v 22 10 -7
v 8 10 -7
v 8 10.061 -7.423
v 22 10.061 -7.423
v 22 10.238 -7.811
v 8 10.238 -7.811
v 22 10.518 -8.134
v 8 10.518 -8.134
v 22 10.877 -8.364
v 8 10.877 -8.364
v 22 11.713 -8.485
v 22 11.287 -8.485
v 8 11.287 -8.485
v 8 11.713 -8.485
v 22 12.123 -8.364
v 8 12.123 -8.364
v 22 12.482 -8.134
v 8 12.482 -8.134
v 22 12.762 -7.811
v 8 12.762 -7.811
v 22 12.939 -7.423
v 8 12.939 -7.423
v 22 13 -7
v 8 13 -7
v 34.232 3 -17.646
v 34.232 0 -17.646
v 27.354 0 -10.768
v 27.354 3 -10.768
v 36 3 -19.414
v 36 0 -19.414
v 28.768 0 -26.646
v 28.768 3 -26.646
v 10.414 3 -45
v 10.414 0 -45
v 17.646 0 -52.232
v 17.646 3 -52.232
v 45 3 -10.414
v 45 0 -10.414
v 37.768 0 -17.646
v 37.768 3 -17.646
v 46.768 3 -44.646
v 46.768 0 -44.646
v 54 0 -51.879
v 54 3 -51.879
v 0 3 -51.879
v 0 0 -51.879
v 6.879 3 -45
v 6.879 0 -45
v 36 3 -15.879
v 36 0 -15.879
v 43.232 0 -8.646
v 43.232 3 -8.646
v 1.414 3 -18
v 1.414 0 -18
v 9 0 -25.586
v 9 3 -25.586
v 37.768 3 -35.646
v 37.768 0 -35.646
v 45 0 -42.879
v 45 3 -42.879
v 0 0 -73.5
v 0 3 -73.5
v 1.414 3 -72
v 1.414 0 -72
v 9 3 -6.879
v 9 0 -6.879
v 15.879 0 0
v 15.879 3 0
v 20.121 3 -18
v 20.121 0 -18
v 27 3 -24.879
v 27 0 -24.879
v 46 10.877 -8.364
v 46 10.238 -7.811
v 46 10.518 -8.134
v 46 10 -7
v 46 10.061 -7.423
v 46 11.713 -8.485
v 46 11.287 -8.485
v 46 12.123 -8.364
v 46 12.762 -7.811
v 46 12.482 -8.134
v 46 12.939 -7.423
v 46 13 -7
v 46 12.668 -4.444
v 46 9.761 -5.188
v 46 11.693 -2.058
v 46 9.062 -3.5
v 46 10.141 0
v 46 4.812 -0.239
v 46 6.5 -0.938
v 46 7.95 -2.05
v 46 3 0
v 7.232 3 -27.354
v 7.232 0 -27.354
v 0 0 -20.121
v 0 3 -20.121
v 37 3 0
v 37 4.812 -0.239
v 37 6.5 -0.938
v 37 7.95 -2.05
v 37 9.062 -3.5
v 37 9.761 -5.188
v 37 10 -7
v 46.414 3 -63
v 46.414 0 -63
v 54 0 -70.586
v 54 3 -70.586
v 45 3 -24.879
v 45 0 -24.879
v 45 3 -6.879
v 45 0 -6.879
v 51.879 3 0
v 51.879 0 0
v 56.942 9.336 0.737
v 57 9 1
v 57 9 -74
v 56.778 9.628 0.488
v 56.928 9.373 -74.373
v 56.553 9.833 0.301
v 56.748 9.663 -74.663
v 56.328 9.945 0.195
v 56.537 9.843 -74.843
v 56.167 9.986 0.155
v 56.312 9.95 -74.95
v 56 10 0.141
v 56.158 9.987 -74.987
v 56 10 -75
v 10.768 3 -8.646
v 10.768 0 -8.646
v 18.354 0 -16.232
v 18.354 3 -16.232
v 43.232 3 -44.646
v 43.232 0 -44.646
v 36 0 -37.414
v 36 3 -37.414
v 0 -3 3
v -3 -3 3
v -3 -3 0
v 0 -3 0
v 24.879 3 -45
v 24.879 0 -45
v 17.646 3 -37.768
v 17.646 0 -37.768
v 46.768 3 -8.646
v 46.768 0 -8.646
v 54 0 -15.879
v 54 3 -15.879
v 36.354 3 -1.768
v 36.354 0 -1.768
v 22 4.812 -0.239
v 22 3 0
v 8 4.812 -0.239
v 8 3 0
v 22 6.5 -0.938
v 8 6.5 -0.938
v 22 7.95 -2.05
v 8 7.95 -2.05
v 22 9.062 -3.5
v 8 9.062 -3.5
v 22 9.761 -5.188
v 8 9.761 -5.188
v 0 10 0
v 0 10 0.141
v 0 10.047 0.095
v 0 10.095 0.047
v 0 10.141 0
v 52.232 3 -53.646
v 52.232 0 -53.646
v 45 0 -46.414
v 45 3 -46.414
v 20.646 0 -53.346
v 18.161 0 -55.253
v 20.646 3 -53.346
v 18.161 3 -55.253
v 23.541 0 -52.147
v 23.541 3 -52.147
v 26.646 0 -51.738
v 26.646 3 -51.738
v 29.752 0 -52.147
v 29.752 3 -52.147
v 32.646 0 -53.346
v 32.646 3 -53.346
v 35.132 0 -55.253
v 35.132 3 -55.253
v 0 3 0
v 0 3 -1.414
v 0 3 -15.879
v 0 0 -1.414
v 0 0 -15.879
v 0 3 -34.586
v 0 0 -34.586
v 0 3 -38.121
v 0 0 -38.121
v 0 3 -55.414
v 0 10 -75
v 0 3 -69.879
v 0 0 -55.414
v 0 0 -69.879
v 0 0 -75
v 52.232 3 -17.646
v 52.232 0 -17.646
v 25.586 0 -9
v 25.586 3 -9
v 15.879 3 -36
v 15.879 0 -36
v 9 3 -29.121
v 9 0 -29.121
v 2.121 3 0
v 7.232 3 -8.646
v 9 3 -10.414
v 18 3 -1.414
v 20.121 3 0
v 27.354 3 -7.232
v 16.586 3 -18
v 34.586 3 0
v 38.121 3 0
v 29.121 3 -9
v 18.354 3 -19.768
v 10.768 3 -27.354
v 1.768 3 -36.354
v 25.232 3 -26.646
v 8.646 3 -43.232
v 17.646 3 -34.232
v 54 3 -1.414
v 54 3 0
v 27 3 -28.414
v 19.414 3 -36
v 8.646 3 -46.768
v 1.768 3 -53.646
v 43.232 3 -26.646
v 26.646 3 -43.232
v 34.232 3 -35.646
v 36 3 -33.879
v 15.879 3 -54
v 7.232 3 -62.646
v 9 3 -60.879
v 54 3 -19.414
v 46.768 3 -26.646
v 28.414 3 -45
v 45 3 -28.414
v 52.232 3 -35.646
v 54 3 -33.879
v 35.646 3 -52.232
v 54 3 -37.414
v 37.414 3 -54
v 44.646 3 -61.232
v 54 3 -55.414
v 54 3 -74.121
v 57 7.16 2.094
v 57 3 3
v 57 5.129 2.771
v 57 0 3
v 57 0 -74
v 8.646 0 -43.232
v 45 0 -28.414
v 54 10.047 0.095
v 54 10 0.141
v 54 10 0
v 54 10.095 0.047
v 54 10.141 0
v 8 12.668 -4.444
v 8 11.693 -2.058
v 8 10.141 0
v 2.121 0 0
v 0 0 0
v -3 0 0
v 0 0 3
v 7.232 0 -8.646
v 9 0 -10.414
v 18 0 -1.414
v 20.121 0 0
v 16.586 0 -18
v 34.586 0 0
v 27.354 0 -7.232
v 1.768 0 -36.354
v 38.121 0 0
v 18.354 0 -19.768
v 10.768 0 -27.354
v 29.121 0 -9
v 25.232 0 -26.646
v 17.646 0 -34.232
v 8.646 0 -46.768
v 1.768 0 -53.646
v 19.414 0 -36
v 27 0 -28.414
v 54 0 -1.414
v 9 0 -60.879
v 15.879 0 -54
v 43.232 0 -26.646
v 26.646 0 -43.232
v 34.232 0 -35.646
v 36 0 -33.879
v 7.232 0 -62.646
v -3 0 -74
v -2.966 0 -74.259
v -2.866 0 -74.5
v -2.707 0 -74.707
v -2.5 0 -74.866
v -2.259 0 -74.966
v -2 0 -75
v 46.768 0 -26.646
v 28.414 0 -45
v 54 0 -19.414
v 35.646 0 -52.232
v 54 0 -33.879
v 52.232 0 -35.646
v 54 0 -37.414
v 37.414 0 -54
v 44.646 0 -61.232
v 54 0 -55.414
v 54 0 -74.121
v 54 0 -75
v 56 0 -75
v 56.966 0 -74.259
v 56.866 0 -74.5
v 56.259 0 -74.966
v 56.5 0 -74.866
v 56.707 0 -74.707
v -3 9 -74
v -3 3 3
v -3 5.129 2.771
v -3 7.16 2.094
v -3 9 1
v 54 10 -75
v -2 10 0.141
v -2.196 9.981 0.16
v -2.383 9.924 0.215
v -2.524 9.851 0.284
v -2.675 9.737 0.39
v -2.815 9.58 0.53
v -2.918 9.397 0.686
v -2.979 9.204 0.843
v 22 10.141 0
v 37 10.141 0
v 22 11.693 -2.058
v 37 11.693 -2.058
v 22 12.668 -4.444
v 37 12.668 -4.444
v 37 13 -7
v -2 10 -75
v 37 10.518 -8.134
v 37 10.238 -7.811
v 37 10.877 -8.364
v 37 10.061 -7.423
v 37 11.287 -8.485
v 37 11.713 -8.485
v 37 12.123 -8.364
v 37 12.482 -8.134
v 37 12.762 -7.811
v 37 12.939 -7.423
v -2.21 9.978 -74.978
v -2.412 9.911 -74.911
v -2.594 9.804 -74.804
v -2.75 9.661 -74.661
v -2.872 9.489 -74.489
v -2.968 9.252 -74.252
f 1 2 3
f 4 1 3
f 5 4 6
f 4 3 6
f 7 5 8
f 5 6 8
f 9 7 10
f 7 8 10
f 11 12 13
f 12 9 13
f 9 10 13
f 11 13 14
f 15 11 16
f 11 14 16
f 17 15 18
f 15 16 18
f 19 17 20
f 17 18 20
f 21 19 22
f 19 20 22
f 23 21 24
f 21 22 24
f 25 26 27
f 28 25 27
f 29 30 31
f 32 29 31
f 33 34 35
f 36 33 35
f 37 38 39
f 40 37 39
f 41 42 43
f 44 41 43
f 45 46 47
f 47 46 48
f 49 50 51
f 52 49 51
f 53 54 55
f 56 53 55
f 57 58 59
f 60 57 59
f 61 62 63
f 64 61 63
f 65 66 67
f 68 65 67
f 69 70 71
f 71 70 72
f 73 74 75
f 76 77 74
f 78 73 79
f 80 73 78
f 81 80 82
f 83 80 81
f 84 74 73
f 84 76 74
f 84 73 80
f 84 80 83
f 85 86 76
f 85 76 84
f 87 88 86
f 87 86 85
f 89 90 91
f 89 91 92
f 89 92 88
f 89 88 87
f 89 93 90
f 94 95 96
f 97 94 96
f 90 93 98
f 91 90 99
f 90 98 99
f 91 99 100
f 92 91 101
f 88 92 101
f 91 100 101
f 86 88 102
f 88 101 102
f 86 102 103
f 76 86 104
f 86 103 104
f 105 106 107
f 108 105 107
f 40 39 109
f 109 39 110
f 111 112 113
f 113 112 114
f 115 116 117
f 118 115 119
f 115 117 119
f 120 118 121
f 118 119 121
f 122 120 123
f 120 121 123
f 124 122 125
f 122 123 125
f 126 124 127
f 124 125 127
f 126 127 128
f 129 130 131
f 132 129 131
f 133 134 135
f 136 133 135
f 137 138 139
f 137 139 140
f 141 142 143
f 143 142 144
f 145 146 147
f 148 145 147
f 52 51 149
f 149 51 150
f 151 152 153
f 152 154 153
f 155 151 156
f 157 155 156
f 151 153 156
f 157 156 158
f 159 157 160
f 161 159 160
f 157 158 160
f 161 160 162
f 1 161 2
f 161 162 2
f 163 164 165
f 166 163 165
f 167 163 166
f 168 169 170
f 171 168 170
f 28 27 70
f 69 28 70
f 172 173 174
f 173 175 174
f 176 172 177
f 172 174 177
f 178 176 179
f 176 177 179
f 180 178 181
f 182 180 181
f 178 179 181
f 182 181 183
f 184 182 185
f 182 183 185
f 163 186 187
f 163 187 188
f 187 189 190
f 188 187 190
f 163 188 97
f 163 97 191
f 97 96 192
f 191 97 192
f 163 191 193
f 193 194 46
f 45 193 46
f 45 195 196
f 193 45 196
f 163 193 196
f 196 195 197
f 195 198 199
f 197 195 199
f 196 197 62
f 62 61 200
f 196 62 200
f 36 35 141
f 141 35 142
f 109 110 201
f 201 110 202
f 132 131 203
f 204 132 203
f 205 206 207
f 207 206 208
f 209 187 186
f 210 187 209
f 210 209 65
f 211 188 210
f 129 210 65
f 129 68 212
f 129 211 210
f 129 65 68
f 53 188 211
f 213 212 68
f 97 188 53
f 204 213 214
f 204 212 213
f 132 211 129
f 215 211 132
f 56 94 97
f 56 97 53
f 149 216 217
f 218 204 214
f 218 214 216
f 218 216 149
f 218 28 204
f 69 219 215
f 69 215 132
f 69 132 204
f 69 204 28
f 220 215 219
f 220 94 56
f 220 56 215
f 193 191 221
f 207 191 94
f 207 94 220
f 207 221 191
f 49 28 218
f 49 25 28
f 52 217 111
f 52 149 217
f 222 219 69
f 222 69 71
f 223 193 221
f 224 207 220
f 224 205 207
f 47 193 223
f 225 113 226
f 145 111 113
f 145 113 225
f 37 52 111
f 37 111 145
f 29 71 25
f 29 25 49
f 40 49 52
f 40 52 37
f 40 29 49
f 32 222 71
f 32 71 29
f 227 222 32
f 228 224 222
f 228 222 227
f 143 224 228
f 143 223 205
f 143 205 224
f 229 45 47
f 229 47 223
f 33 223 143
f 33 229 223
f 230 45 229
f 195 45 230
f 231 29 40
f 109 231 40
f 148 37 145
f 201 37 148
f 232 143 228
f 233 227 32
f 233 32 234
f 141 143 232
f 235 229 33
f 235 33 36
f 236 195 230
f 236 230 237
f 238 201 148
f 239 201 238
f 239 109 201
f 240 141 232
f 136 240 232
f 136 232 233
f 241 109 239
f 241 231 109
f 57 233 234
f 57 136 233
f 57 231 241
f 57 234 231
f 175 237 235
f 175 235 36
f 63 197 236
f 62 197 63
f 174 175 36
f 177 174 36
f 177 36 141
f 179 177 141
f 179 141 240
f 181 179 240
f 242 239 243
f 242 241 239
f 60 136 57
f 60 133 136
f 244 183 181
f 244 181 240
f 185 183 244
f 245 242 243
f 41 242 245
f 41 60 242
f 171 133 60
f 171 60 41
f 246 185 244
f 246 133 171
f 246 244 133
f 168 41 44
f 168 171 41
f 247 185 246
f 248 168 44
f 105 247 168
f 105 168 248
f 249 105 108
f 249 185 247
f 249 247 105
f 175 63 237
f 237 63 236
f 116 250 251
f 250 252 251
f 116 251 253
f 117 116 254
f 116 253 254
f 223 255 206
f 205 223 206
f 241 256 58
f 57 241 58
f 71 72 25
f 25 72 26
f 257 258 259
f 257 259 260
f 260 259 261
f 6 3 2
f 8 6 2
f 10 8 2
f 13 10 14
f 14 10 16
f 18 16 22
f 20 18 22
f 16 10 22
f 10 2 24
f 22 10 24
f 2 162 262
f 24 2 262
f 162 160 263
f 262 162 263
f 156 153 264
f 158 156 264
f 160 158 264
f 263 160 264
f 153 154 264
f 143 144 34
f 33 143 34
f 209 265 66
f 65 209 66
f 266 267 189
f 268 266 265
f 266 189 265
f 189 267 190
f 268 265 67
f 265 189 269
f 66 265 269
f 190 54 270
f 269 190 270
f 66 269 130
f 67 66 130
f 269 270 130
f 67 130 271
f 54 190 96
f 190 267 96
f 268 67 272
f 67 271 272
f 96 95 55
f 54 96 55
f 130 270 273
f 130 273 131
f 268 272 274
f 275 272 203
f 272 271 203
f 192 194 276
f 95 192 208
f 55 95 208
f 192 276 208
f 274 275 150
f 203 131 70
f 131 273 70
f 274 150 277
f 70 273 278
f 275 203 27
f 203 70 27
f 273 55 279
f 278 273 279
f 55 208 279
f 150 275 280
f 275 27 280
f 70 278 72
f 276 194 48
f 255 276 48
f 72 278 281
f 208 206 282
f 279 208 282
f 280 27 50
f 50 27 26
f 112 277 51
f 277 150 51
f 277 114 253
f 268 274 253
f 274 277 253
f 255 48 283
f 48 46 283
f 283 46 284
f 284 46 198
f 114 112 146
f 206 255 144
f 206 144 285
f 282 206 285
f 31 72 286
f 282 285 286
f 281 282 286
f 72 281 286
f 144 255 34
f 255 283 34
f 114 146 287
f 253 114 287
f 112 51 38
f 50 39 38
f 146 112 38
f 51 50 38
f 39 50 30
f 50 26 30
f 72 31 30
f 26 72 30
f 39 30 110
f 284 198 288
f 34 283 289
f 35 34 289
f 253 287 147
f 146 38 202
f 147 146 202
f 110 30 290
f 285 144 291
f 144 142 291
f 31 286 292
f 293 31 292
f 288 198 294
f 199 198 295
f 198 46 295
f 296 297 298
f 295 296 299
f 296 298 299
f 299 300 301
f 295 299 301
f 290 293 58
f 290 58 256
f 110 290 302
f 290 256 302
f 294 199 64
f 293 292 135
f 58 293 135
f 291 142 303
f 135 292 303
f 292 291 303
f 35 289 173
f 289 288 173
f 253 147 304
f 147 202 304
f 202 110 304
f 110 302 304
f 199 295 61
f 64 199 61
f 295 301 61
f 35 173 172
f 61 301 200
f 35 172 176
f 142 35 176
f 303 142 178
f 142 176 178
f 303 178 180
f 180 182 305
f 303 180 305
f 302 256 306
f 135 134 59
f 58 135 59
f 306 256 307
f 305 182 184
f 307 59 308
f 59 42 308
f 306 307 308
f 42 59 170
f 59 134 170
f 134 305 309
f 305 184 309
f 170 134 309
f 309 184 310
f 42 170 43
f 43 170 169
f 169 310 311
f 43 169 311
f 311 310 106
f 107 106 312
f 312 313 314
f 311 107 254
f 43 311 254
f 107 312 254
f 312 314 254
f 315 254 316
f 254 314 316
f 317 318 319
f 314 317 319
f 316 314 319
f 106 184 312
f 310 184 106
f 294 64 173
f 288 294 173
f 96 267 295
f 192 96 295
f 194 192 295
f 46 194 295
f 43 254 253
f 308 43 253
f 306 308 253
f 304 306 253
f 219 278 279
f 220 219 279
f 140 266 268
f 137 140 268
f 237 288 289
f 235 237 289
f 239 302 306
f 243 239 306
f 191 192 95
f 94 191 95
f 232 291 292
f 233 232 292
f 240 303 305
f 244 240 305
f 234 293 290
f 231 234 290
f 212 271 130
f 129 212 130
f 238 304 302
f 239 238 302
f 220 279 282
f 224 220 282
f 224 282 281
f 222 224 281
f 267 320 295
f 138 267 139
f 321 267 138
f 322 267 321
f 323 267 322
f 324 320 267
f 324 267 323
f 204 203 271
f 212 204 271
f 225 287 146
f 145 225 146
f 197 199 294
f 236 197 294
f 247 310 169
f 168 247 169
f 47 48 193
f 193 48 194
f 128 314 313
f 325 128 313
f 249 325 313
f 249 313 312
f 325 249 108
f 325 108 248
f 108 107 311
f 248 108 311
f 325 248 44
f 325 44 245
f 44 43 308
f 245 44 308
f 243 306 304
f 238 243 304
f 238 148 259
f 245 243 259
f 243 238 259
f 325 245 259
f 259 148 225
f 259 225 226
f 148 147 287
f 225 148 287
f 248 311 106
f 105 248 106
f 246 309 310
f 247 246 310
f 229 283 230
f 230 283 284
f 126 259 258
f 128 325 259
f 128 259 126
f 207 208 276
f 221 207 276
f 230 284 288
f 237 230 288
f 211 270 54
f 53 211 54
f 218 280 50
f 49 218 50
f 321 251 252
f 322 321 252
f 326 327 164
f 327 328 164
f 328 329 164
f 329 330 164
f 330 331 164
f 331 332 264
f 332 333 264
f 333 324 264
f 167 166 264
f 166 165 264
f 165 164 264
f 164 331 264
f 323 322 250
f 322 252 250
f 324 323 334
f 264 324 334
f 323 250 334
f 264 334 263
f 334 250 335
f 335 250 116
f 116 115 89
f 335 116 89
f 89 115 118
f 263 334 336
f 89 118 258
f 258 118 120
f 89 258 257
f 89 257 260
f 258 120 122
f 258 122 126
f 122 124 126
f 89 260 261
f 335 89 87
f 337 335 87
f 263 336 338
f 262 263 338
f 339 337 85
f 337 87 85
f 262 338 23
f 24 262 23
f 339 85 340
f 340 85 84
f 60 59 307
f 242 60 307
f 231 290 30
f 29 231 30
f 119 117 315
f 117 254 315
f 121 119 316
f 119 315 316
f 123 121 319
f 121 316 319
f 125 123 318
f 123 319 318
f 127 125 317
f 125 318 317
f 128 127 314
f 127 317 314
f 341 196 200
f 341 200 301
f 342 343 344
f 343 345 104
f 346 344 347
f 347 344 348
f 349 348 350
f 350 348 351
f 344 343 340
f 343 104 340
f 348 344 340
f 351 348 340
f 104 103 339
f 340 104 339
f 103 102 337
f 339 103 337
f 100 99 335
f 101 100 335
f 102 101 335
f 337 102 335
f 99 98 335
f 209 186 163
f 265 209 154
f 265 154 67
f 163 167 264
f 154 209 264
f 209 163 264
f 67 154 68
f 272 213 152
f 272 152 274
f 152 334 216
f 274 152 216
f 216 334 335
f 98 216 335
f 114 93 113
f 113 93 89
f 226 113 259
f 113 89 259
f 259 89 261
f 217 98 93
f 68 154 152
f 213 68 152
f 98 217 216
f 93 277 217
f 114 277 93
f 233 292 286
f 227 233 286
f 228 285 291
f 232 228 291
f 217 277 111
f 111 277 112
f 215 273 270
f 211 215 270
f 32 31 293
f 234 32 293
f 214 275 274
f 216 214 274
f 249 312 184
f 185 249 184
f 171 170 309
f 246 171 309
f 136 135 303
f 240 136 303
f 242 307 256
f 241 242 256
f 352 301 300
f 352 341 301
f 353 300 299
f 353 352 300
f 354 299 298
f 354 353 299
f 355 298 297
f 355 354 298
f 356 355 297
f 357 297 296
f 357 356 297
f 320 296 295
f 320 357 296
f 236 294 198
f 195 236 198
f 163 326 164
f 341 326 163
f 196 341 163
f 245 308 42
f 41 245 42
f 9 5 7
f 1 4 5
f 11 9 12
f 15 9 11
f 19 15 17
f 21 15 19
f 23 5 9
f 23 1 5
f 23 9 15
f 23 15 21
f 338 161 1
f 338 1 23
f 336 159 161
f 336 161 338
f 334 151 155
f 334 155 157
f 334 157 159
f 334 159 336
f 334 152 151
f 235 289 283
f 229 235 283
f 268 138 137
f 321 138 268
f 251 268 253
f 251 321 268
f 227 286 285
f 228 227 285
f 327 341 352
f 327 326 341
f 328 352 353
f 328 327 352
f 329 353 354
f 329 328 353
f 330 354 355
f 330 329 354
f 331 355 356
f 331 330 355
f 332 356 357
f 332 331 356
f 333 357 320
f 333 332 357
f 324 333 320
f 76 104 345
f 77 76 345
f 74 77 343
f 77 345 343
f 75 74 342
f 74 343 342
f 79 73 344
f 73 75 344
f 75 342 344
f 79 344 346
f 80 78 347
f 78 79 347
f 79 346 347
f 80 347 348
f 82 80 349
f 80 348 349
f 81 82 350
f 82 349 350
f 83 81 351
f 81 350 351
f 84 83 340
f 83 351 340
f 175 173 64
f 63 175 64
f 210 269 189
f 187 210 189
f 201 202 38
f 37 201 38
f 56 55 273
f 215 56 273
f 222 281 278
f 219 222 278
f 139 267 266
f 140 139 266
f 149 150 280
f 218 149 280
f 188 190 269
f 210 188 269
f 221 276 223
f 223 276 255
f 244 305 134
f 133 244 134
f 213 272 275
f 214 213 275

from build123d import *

# Parameters (mm, degrees)
SKETCH1_W               = 60
SKETCH1_H               = 78
SKETCH1_W_2             = 54
SKETCH1_H_2             = 72
EXTRUDE_THIN1_DEPTH     = 3
EXTRUDE_THIN2_DEPTH     = 3
BOSS_EXTRUDE1_DEPTH     = 7
SKETCH5_W               = 9
SKETCH5_H               = 3
BOSS_EXTRUDE2_DEPTH     = 10
SKETCH5_W_2             = 14
BOSS_EXTRUDE2_2_DEPTH   = 10
SKETCH6_W               = 3
SKETCH6_H               = 3
BOSS_EXTRUDE3_DEPTH     = 3
CUT_EXTRUDE1_DEPTH      = 95.731198662
SKETCH9_W               = 54
SKETCH9_H               = 3
BOSS_EXTRUDE4_DEPTH     = 3
FILLET1_R               = 7
FILLET2_R               = 10
CUT_EXTRUDE2_REACH      = 92.526
CUT_EXTRUDE3_DEPTH      = 97.922649572
CUT_EXTRUDE3_DEPTH_BACK = 97.922649572
SKETCH11_W              = 3
SKETCH11_H              = 3
FILLET3_R               = 1
CUT_EXTRUDE4_DEPTH      = 95.731198812
FILLET4_R               = 12
SKETCH14_W              = 3
SKETCH14_H              = 3
BOSS_EXTRUDE5_DEPTH     = 3


# Read off the part's stored shape, not the designer's step: Extrude-Thin2
# Some blends are built 0.0001 mm under size
with BuildPart() as part:
    # Sketch1 → Extrude-Thin1 (new body)
    with BuildSketch(Plane(origin=(0, 0, 0), x_dir=(1, 0, 0), z_dir=(0, 1, 0))):
        with Locations((27, 36)):
            Rectangle(SKETCH1_W, SKETCH1_H)
        with Locations((27, 36)):
            Rectangle(SKETCH1_W_2, SKETCH1_H_2, mode=Mode.SUBTRACT)
    extrude(amount=EXTRUDE_THIN1_DEPTH)

    # Extrude-Thin2 outline → Extrude-Thin2 (add)
    with BuildSketch(Plane(origin=(0, 0, 0), x_dir=(1, 0, 0), z_dir=(0, 1, 0))):
        Polygon((0, 69.878679656), (7.232233047, 62.646446609), (0, 55.414213562), (0, 51.878679656), (6.878679656, 45), (0, 38.121320344), (0, 34.585786438), (7.232233047, 27.353553391), (0, 20.121320344), (0, 15.878679656), (7.232233047, 8.646446609), (0, 1.414213562), (0, 0), (2.121320344, 0), (9, 6.878679656), (15.878679656, 0), (20.121320344, 0), (27.353553391, 7.232233047), (34.585786438, 0), (38.121320344, 0), (45, 6.878679656), (51.878679656, 0), (54, 0), (54, 1.414213562), (46.767766953, 8.646446609), (54, 15.878679656), (54, 19.414213562), (46.767766953, 26.646446609), (54, 33.878679656), (54, 37.414213562), (46.767766953, 44.646446609), (54, 51.878679656), (54, 55.414213562), (46.414213562, 63), (54, 70.585786438), (54, 72), (51.878679656, 72), (44.646446609, 64.767766953), (37.414213562, 72), (33.878679656, 72), (26.646446609, 64.767766953), (19.414213562, 72), (16.585786438, 72), (9, 64.414213562), (1.414213562, 72), (0, 72), align=None)
        Polygon((10.767766953, 8.646446609), (18.353553391, 16.232233047), (25.585786438, 9), (18, 1.414213562), align=None, mode=Mode.SUBTRACT)
        Polygon((9, 10.414213562), (1.414213562, 18), (9, 25.585786438), (16.585786438, 18), align=None, mode=Mode.SUBTRACT)
        Polygon((18.353553391, 19.767766953), (10.767766953, 27.353553391), (17.646446609, 34.232233047), (25.232233047, 26.646446609), align=None, mode=Mode.SUBTRACT)
        Polygon((26.646446609, 43.232233047), (34.232233047, 35.646446609), (27, 28.414213562), (19.414213562, 36), align=None, mode=Mode.SUBTRACT)
        Polygon((29.121320344, 9), (36, 15.878679656), (43.232233047, 8.646446609), (36.353553391, 1.767766953), align=None, mode=Mode.SUBTRACT)
        Polygon((20.121320344, 18), (27, 24.878679656), (34.232233047, 17.646446609), (27.353553391, 10.767766953), align=None, mode=Mode.SUBTRACT)
        Polygon((45, 24.878679656), (52.232233047, 17.646446609), (45, 10.414213562), (37.767766953, 17.646446609), align=None, mode=Mode.SUBTRACT)
        Polygon((36, 33.878679656), (43.232233047, 26.646446609), (36, 19.414213562), (28.767766953, 26.646446609), align=None, mode=Mode.SUBTRACT)
        Polygon((52.232233047, 35.646446609), (45, 28.414213562), (37.767766953, 35.646446609), (45, 42.878679656), align=None, mode=Mode.SUBTRACT)
        Polygon((15.878679656, 36), (9, 29.121320344), (1.767766953, 36.353553391), (8.646446609, 43.232233047), align=None, mode=Mode.SUBTRACT)
        Polygon((9, 60.878679656), (15.878679656, 54), (8.646446609, 46.767766953), (1.767766953, 53.646446609), align=None, mode=Mode.SUBTRACT)
        Polygon((17.646446609, 52.232233047), (24.878679656, 45), (17.646446609, 37.767766953), (10.414213562, 45), align=None, mode=Mode.SUBTRACT)
        Polygon((24.878679656, 63), (17.646446609, 55.767766953), (10.767766953, 62.646446609), (18, 69.878679656), align=None, mode=Mode.SUBTRACT)
        Polygon((33.878679656, 54), (26.646446609, 46.767766953), (19.414213562, 54), (26.646446609, 61.232233047), align=None, mode=Mode.SUBTRACT)
        Polygon((43.232233047, 44.646446609), (36, 37.414213562), (28.414213562, 45), (35.646446609, 52.232233047), align=None, mode=Mode.SUBTRACT)
        Polygon((45, 46.414213562), (37.414213562, 54), (44.646446609, 61.232233047), (52.232233047, 53.646446609), align=None, mode=Mode.SUBTRACT)
        Polygon((42.878679656, 63), (35.646446609, 55.767766953), (28.414213562, 63), (35.646446609, 70.232233047), align=None, mode=Mode.SUBTRACT)
    extrude(amount=EXTRUDE_THIN2_DEPTH)

    # Sketch4 → Boss-Extrude1 (add)
    with BuildSketch(Plane(origin=(0, 3, 0), x_dir=(1, 0, 0), z_dir=(0, 1, 0))):
        Polygon((0, 0), (0, 72), (0, 75), (-3, 75), (-3, -3), (57, -3), (57, 75), (54, 75), (54, 72), (54, 0), align=None)
    extrude(amount=BOSS_EXTRUDE1_DEPTH)

    # Sketch6 → Boss-Extrude3 (add)
    with BuildSketch(Plane.XZ):
        with Locations((-1.5, 1.5)):
            Rectangle(SKETCH6_W, SKETCH6_H)
    extrude(amount=BOSS_EXTRUDE3_DEPTH)

    # Sketch7 → Cut-Extrude1 (cut, through all)
    with BuildSketch(Plane(origin=(0, 3, 0), x_dir=(1, 0, 0), z_dir=(0, 1, 0))):
        Polygon((33.878679656, 72), (36.878679656, 75), (16.414213562, 75), (0, 75), (0, 73.5), (1.414213562, 72), (17.646446609, 55.767766953), (26.646446609, 64.767766953), align=None)
    extrude(amount=-CUT_EXTRUDE1_DEPTH, mode=Mode.SUBTRACT)



with BuildPart() as body_2:
    # Sketch5 → Boss-Extrude2 (new body)
    with BuildSketch(Plane(origin=(0, 0, 0), x_dir=(-1, 0, 0), z_dir=(0, 0, -1))):
        with Locations((-41.5, 11.5)):
            Rectangle(SKETCH5_W, SKETCH5_H)
    extrude(amount=BOSS_EXTRUDE2_DEPTH)


with BuildPart() as body_3:
    # Sketch5 → Boss-Extrude2 2 (new body)
    with BuildSketch(Plane(origin=(0, 0, 0), x_dir=(-1, 0, 0), z_dir=(0, 0, -1))):
        with Locations((-15, 11.5)):
            Rectangle(SKETCH5_W_2, SKETCH5_H)
    extrude(amount=BOSS_EXTRUDE2_2_DEPTH)


with BuildPart() as part_1:
    add(part.part)

    add(body_2.part)  # Boss-Extrude4 merges body 2

    add(body_3.part)  # Boss-Extrude4 merges body 3
    # Sketch9 → Boss-Extrude4 (add)
    with BuildSketch(Plane.XY):
        with Locations((27, 11.5)):
            Rectangle(SKETCH9_W, SKETCH9_H)
    extrude(amount=BOSS_EXTRUDE4_DEPTH)

    # Fillet1
    fillet1_edges = [part_1.edges().sort_by_distance(p)[0] for p in [
        (41.5, 10, 0),
        (15, 10, 0),
    ]]
    fillet(fillet1_edges, radius=FILLET1_R - 0.0001)  # a hair under: the kernel refuses the full size

    # Fillet2
    # the kernel refuses this fillet: 10 mm, written as the material it takes off along each edge
    with BuildSketch(Plane(origin=(79, 13, 3), x_dir=(0, -1, 0), z_dir=(-1, 0, 0))) as fillet2_piece_1:
        with BuildLine():
            CenterArc((FILLET2_R, -FILLET2_R), FILLET2_R, 90, 90)
            Line((0, -FILLET2_R), (0, 0))
            Line((0, 0), (FILLET2_R, 0))
        make_face()
    extrude(amount=104, mode=Mode.SUBTRACT)

    # Sketch10 → Cut-Extrude2 (cut, up to next)
    with BuildSketch(Plane.ZY.offset(-8), mode=Mode.PRIVATE) as cut_extrude2_sk1:
        with BuildLine():
            ThreePointArc((-7, 10), (-8.5, 11.5), (-7, 13))
            Line((-7, 13), (-10, 13))
            Line((-10, 13), (-10, 10))
            Line((-10, 10), (-7, 10))
        make_face()
    cut_extrude2_tool1 = extrude(cut_extrude2_sk1.sketch, amount=-CUT_EXTRUDE2_REACH, mode=Mode.PRIVATE) & part_1.part
    add(cut_extrude2_tool1.solids().sort_by_distance((8, 11.5, -9.058288))[0], mode=Mode.SUBTRACT)
    add(cut_extrude2_tool1.solids().sort_by_distance((8, 11.5, -9.058288))[1], mode=Mode.SUBTRACT)

    # Sketch11 → Cut-Extrude3 (cut, two sides: drawn at the far end of the back side and taken through both)
    with BuildSketch(Plane.ZY.offset(3).offset(-CUT_EXTRUDE3_DEPTH_BACK)):
        with Locations((1.5, -1.5)):
            Rectangle(SKETCH11_W, SKETCH11_H)
    extrude(amount=CUT_EXTRUDE3_DEPTH + CUT_EXTRUDE3_DEPTH_BACK, mode=Mode.SUBTRACT)

    # Fillet3
    fillet3_edges = [part_1.edges().sort_by_distance(p)[0] for p in [
        (57, 10, -37.429285786),
        (-3, 10, -37.429285786),
        (-3, 5, -75),
        (57, 5, -75),
    ]]
    fillet(fillet3_edges, radius=FILLET3_R)

    # Sketch12 → Cut-Extrude4 (cut, through all)
    with BuildSketch(Plane(origin=(0, 3, 0), x_dir=(1, 0, 0), z_dir=(0, 1, 0))):
        Polygon((17.646446609, 55.767766953), (26.646446609, 46.767766953), (54, 74.121320344), (54, 75), (17.646446609, 75), align=None)
    extrude(amount=-CUT_EXTRUDE4_DEPTH, mode=Mode.SUBTRACT)

    # Fillet4
    fillet4_edges = [part_1.edges().sort_by_distance(p)[0] for p in [
        (26.646446609, 1.5, -46.767766953),
    ]]
    fillet(fillet4_edges, radius=FILLET4_R)

    # Sketch14 → Boss-Extrude5 (add)
    with BuildSketch(Plane.XZ):
        with Locations((-1.5, 1.5)):
            Rectangle(SKETCH14_W, SKETCH14_H)
    extrude(amount=BOSS_EXTRUDE5_DEPTH)


solid = part_1.part
